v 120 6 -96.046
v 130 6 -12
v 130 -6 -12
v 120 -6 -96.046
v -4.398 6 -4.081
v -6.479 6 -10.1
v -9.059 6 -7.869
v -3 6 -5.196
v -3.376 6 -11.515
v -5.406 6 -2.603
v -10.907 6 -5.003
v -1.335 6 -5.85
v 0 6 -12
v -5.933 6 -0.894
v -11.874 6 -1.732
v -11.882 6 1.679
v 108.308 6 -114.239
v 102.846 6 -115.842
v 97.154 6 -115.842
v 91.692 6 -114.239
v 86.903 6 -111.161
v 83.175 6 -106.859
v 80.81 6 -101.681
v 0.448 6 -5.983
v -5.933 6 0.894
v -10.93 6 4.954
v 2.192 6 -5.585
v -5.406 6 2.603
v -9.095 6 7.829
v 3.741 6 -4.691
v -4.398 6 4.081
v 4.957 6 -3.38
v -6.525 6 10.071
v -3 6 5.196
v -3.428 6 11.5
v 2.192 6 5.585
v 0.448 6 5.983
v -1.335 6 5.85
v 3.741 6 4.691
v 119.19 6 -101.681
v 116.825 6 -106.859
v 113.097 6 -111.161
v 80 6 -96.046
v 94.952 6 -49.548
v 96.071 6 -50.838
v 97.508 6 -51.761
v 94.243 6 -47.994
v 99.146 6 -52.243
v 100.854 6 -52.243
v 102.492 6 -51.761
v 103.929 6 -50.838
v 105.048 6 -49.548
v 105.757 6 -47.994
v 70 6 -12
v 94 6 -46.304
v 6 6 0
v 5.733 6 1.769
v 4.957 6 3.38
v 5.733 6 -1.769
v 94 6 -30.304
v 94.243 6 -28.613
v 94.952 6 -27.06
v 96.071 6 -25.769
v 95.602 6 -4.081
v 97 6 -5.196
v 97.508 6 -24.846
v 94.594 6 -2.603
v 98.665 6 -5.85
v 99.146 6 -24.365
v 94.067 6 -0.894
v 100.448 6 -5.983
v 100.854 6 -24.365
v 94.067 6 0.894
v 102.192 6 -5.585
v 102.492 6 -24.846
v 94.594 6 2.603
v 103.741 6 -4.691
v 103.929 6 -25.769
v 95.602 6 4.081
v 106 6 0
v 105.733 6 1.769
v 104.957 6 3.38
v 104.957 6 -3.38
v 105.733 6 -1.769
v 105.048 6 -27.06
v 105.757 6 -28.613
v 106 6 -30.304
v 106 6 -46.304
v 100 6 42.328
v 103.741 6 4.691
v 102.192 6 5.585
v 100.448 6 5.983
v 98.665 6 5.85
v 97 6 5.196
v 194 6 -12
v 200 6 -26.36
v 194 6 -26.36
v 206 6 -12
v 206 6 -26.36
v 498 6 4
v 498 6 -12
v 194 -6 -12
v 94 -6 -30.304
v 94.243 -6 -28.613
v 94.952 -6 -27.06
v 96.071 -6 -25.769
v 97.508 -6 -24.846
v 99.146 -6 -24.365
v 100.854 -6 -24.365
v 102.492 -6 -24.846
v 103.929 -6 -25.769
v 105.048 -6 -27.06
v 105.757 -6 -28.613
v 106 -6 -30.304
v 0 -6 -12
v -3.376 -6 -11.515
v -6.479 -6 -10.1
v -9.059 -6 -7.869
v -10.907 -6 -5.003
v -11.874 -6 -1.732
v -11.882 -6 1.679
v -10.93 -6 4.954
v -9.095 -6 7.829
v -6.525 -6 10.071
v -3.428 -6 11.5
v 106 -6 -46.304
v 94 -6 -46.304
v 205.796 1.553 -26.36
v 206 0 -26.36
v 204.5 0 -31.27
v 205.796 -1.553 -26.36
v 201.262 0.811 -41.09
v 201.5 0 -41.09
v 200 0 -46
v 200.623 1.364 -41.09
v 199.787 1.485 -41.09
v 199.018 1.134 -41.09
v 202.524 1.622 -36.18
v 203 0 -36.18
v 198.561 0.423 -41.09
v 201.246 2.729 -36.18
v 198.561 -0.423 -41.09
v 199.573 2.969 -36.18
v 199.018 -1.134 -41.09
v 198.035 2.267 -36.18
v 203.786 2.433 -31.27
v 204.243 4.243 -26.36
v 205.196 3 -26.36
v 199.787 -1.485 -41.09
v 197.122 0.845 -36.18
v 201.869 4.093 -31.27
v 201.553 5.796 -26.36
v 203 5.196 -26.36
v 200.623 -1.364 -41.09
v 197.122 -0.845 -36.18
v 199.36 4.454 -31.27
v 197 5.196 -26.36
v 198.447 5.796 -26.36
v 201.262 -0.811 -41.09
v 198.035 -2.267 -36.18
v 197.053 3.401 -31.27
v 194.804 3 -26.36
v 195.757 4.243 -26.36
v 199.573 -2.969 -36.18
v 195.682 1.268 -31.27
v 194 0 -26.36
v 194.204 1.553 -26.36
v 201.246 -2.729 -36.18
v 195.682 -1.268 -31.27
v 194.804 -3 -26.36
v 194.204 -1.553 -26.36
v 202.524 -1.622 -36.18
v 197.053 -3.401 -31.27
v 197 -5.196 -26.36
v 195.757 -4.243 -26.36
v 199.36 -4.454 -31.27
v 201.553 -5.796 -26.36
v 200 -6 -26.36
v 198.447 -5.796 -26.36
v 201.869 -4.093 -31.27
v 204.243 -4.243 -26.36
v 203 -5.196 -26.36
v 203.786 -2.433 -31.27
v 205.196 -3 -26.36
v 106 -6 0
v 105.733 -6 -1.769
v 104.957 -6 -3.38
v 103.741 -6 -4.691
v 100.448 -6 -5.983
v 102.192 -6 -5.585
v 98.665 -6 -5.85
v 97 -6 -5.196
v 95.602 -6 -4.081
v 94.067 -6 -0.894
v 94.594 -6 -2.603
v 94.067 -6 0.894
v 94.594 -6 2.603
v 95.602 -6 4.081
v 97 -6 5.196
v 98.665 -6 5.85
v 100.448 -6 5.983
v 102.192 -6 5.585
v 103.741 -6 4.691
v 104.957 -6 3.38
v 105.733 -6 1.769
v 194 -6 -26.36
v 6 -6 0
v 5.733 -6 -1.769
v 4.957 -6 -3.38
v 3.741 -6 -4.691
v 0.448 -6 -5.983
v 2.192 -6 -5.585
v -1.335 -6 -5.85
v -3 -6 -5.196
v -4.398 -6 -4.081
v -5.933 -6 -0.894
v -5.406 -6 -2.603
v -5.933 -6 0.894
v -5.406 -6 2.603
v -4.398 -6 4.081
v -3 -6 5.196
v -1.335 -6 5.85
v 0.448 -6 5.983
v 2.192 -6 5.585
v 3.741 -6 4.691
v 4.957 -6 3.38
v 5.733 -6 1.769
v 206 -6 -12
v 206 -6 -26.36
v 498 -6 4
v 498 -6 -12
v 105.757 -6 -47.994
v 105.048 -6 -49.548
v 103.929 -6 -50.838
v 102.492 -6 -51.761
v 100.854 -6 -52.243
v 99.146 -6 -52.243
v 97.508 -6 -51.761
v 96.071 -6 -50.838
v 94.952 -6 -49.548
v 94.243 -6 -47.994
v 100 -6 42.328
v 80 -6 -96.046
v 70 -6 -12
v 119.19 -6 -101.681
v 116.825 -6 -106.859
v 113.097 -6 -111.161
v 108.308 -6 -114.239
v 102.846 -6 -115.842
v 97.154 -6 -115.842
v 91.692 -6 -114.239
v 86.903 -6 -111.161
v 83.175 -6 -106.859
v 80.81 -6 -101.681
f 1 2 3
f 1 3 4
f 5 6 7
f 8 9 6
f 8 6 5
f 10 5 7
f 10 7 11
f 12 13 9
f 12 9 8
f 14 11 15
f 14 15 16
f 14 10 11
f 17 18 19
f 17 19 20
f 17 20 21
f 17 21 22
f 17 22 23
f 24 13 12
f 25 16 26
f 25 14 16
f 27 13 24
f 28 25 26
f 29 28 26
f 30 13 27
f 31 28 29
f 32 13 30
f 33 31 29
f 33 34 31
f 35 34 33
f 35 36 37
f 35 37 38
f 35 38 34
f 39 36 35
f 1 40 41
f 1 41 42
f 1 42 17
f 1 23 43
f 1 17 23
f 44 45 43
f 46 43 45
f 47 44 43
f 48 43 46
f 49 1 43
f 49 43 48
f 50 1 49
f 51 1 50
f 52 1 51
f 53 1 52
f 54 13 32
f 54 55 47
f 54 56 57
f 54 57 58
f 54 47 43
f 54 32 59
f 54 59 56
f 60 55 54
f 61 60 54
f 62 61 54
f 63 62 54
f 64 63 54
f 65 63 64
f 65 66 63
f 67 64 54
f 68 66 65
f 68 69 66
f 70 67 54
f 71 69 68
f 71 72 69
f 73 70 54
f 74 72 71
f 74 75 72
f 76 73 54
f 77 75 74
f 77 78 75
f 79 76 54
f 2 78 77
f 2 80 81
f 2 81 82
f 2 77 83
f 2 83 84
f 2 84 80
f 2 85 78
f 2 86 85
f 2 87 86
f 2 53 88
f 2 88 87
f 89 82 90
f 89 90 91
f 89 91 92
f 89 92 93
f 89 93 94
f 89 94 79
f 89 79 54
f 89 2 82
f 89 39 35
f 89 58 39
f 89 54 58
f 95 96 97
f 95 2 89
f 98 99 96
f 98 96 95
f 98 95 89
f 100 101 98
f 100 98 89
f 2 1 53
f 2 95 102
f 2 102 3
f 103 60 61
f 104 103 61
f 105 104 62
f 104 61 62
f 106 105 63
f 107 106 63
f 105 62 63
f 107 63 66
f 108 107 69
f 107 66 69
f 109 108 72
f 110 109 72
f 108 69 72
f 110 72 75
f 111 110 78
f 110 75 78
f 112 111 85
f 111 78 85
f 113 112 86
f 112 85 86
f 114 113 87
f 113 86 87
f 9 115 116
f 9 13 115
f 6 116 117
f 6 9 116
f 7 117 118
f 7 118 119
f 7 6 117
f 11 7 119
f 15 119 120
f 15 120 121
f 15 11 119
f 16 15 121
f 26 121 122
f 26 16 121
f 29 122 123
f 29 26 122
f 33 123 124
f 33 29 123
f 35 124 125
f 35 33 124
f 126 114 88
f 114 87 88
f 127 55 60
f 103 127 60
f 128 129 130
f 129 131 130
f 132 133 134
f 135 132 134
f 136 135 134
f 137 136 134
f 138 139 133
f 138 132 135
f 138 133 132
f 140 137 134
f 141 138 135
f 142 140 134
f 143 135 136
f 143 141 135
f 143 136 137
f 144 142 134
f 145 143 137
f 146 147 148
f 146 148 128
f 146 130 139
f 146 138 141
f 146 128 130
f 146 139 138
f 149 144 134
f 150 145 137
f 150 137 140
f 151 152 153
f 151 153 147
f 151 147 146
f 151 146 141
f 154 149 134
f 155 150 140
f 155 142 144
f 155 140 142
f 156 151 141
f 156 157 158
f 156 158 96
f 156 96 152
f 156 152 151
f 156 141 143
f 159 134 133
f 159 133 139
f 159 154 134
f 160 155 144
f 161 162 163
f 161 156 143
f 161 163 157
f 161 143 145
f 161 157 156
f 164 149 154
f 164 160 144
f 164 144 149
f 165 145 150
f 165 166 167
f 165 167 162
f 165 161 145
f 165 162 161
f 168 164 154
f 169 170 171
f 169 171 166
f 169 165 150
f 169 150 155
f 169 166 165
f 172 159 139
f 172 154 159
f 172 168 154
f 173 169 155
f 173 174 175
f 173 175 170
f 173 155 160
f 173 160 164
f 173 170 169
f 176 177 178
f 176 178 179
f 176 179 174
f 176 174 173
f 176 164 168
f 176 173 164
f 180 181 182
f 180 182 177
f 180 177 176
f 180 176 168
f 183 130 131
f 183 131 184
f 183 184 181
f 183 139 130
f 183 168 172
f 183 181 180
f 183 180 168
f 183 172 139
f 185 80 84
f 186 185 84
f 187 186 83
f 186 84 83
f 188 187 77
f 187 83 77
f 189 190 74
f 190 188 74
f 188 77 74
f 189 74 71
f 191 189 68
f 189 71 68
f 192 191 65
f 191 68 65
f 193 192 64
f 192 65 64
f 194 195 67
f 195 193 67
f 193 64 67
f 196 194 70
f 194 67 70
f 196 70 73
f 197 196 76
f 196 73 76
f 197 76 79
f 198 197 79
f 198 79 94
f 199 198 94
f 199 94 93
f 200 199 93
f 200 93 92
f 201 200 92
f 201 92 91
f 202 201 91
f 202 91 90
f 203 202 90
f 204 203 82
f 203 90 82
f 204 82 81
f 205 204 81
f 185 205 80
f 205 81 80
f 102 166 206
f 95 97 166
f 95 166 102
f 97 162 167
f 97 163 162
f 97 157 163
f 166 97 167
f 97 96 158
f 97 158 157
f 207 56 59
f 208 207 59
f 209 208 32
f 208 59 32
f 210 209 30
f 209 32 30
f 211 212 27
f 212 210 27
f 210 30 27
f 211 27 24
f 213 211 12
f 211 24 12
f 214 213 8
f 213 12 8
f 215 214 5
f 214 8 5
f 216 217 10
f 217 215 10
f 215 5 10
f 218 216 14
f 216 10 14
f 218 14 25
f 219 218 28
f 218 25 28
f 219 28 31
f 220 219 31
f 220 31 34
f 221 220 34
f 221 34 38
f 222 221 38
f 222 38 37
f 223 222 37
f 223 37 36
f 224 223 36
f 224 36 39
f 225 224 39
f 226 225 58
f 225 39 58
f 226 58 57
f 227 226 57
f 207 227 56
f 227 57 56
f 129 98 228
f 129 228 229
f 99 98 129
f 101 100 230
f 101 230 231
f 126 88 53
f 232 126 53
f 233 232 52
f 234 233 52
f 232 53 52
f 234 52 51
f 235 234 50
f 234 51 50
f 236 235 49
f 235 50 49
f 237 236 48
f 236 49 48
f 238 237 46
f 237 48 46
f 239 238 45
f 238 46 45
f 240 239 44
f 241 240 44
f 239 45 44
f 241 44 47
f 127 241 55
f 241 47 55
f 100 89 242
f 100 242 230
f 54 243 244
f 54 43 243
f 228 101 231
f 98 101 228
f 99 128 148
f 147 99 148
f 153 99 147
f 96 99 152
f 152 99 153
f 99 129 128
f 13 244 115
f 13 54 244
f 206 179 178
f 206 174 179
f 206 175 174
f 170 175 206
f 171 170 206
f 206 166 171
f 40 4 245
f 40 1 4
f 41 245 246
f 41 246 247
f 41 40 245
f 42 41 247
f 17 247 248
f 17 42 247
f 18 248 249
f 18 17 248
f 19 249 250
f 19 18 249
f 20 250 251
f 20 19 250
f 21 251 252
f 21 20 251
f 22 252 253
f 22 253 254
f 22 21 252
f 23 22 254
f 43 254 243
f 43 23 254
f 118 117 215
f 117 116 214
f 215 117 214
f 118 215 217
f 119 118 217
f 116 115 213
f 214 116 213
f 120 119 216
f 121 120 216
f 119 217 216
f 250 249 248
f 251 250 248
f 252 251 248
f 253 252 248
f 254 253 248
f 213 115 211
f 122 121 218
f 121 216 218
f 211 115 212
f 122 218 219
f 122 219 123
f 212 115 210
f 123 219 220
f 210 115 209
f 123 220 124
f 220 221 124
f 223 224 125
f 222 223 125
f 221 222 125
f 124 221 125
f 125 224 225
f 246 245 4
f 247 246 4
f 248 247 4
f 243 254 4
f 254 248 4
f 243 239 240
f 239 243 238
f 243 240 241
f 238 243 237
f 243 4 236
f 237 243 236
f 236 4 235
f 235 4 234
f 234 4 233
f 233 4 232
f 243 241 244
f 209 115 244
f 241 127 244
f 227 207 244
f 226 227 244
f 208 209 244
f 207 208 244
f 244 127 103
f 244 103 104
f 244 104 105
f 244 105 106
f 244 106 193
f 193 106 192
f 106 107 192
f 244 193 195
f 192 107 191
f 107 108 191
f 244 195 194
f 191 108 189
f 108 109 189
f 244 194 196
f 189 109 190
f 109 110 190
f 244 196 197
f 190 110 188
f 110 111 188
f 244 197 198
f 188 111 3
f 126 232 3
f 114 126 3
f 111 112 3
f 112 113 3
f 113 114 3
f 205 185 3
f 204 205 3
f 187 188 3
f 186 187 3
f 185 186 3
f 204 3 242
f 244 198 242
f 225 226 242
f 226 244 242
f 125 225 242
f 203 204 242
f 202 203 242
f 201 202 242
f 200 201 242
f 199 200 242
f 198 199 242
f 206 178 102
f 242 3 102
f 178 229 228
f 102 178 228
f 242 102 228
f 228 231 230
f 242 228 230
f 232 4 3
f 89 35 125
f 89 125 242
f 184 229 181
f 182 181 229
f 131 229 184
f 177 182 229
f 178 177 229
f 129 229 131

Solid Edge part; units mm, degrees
sketch "Sketch1" plane through (0, 0, 0) normal (0, -1, 0) x (1, 0, 0)
  line L0 (70, -12) -> (0, -12)
  arc A0 (0, -12) -> (-3.4277, 11.5) centre (0, 0) cw
  line L1 (-3.4277, 11.5) -> (100, 42.328)
  line L2 (100, 42.328) -> (498, 4)
  line L3 (498, 4) -> (498, -12)
  line L4 (498, -12) -> (206, -12)
  line L5 (206, -12) -> (206, -26.3599)
  line L6 (206, -26.3599) -> (194, -26.3599)
  line L7 (194, -26.3599) -> (194, -12)
  line L8 (194, -12) -> (130, -12)
  line L9 (130, -12) -> (120, -96.0459)
  arc A1 (120, -96.0459) -> (80, -96.0459) centre (100, -96.0459) cw
  line L10 (80, -96.0459) -> (70, -12)
  circle A2 centre (0, 0) radius 6
  circle A3 centre (100, 0) radius 6
  line L11 (94, -46.3037) -> (94, -30.3037)
  arc A4 (106, -46.3037) -> (94, -46.3037) centre (100, -46.3037) cw
  line L12 (106, -30.3037) -> (106, -46.3037)
  arc A5 (94, -30.3037) -> (106, -30.3037) centre (100, -30.3037) cw
  dimension "D1" = 24
  dimension "D2" = 12
  dimension "D3" = 100
  dimension "D4" = 12
  dimension "D5" = 12
  dimension "D6" = 510
  dimension "D7" = 16
extrude "Protrusion1" add sketch "Sketch1" along normal mid plane 12
sketch "Sketch2" plane through (0, 0, 0) normal (0, -1, 0) x (1, 0, 0)
  line L0 (200, -46) -> (206, -26.3599)
  line L1 (206, -26.3599) -> (200, -26.3599)
  dimension "D1" = 46
revolve "RevolvedProtrusion1" add sketch "Sketch2" angle 360 about axis through (200, 0, -26.3599) along (0, 0, -1)
properties part number "11" material "Fe 410 W"
